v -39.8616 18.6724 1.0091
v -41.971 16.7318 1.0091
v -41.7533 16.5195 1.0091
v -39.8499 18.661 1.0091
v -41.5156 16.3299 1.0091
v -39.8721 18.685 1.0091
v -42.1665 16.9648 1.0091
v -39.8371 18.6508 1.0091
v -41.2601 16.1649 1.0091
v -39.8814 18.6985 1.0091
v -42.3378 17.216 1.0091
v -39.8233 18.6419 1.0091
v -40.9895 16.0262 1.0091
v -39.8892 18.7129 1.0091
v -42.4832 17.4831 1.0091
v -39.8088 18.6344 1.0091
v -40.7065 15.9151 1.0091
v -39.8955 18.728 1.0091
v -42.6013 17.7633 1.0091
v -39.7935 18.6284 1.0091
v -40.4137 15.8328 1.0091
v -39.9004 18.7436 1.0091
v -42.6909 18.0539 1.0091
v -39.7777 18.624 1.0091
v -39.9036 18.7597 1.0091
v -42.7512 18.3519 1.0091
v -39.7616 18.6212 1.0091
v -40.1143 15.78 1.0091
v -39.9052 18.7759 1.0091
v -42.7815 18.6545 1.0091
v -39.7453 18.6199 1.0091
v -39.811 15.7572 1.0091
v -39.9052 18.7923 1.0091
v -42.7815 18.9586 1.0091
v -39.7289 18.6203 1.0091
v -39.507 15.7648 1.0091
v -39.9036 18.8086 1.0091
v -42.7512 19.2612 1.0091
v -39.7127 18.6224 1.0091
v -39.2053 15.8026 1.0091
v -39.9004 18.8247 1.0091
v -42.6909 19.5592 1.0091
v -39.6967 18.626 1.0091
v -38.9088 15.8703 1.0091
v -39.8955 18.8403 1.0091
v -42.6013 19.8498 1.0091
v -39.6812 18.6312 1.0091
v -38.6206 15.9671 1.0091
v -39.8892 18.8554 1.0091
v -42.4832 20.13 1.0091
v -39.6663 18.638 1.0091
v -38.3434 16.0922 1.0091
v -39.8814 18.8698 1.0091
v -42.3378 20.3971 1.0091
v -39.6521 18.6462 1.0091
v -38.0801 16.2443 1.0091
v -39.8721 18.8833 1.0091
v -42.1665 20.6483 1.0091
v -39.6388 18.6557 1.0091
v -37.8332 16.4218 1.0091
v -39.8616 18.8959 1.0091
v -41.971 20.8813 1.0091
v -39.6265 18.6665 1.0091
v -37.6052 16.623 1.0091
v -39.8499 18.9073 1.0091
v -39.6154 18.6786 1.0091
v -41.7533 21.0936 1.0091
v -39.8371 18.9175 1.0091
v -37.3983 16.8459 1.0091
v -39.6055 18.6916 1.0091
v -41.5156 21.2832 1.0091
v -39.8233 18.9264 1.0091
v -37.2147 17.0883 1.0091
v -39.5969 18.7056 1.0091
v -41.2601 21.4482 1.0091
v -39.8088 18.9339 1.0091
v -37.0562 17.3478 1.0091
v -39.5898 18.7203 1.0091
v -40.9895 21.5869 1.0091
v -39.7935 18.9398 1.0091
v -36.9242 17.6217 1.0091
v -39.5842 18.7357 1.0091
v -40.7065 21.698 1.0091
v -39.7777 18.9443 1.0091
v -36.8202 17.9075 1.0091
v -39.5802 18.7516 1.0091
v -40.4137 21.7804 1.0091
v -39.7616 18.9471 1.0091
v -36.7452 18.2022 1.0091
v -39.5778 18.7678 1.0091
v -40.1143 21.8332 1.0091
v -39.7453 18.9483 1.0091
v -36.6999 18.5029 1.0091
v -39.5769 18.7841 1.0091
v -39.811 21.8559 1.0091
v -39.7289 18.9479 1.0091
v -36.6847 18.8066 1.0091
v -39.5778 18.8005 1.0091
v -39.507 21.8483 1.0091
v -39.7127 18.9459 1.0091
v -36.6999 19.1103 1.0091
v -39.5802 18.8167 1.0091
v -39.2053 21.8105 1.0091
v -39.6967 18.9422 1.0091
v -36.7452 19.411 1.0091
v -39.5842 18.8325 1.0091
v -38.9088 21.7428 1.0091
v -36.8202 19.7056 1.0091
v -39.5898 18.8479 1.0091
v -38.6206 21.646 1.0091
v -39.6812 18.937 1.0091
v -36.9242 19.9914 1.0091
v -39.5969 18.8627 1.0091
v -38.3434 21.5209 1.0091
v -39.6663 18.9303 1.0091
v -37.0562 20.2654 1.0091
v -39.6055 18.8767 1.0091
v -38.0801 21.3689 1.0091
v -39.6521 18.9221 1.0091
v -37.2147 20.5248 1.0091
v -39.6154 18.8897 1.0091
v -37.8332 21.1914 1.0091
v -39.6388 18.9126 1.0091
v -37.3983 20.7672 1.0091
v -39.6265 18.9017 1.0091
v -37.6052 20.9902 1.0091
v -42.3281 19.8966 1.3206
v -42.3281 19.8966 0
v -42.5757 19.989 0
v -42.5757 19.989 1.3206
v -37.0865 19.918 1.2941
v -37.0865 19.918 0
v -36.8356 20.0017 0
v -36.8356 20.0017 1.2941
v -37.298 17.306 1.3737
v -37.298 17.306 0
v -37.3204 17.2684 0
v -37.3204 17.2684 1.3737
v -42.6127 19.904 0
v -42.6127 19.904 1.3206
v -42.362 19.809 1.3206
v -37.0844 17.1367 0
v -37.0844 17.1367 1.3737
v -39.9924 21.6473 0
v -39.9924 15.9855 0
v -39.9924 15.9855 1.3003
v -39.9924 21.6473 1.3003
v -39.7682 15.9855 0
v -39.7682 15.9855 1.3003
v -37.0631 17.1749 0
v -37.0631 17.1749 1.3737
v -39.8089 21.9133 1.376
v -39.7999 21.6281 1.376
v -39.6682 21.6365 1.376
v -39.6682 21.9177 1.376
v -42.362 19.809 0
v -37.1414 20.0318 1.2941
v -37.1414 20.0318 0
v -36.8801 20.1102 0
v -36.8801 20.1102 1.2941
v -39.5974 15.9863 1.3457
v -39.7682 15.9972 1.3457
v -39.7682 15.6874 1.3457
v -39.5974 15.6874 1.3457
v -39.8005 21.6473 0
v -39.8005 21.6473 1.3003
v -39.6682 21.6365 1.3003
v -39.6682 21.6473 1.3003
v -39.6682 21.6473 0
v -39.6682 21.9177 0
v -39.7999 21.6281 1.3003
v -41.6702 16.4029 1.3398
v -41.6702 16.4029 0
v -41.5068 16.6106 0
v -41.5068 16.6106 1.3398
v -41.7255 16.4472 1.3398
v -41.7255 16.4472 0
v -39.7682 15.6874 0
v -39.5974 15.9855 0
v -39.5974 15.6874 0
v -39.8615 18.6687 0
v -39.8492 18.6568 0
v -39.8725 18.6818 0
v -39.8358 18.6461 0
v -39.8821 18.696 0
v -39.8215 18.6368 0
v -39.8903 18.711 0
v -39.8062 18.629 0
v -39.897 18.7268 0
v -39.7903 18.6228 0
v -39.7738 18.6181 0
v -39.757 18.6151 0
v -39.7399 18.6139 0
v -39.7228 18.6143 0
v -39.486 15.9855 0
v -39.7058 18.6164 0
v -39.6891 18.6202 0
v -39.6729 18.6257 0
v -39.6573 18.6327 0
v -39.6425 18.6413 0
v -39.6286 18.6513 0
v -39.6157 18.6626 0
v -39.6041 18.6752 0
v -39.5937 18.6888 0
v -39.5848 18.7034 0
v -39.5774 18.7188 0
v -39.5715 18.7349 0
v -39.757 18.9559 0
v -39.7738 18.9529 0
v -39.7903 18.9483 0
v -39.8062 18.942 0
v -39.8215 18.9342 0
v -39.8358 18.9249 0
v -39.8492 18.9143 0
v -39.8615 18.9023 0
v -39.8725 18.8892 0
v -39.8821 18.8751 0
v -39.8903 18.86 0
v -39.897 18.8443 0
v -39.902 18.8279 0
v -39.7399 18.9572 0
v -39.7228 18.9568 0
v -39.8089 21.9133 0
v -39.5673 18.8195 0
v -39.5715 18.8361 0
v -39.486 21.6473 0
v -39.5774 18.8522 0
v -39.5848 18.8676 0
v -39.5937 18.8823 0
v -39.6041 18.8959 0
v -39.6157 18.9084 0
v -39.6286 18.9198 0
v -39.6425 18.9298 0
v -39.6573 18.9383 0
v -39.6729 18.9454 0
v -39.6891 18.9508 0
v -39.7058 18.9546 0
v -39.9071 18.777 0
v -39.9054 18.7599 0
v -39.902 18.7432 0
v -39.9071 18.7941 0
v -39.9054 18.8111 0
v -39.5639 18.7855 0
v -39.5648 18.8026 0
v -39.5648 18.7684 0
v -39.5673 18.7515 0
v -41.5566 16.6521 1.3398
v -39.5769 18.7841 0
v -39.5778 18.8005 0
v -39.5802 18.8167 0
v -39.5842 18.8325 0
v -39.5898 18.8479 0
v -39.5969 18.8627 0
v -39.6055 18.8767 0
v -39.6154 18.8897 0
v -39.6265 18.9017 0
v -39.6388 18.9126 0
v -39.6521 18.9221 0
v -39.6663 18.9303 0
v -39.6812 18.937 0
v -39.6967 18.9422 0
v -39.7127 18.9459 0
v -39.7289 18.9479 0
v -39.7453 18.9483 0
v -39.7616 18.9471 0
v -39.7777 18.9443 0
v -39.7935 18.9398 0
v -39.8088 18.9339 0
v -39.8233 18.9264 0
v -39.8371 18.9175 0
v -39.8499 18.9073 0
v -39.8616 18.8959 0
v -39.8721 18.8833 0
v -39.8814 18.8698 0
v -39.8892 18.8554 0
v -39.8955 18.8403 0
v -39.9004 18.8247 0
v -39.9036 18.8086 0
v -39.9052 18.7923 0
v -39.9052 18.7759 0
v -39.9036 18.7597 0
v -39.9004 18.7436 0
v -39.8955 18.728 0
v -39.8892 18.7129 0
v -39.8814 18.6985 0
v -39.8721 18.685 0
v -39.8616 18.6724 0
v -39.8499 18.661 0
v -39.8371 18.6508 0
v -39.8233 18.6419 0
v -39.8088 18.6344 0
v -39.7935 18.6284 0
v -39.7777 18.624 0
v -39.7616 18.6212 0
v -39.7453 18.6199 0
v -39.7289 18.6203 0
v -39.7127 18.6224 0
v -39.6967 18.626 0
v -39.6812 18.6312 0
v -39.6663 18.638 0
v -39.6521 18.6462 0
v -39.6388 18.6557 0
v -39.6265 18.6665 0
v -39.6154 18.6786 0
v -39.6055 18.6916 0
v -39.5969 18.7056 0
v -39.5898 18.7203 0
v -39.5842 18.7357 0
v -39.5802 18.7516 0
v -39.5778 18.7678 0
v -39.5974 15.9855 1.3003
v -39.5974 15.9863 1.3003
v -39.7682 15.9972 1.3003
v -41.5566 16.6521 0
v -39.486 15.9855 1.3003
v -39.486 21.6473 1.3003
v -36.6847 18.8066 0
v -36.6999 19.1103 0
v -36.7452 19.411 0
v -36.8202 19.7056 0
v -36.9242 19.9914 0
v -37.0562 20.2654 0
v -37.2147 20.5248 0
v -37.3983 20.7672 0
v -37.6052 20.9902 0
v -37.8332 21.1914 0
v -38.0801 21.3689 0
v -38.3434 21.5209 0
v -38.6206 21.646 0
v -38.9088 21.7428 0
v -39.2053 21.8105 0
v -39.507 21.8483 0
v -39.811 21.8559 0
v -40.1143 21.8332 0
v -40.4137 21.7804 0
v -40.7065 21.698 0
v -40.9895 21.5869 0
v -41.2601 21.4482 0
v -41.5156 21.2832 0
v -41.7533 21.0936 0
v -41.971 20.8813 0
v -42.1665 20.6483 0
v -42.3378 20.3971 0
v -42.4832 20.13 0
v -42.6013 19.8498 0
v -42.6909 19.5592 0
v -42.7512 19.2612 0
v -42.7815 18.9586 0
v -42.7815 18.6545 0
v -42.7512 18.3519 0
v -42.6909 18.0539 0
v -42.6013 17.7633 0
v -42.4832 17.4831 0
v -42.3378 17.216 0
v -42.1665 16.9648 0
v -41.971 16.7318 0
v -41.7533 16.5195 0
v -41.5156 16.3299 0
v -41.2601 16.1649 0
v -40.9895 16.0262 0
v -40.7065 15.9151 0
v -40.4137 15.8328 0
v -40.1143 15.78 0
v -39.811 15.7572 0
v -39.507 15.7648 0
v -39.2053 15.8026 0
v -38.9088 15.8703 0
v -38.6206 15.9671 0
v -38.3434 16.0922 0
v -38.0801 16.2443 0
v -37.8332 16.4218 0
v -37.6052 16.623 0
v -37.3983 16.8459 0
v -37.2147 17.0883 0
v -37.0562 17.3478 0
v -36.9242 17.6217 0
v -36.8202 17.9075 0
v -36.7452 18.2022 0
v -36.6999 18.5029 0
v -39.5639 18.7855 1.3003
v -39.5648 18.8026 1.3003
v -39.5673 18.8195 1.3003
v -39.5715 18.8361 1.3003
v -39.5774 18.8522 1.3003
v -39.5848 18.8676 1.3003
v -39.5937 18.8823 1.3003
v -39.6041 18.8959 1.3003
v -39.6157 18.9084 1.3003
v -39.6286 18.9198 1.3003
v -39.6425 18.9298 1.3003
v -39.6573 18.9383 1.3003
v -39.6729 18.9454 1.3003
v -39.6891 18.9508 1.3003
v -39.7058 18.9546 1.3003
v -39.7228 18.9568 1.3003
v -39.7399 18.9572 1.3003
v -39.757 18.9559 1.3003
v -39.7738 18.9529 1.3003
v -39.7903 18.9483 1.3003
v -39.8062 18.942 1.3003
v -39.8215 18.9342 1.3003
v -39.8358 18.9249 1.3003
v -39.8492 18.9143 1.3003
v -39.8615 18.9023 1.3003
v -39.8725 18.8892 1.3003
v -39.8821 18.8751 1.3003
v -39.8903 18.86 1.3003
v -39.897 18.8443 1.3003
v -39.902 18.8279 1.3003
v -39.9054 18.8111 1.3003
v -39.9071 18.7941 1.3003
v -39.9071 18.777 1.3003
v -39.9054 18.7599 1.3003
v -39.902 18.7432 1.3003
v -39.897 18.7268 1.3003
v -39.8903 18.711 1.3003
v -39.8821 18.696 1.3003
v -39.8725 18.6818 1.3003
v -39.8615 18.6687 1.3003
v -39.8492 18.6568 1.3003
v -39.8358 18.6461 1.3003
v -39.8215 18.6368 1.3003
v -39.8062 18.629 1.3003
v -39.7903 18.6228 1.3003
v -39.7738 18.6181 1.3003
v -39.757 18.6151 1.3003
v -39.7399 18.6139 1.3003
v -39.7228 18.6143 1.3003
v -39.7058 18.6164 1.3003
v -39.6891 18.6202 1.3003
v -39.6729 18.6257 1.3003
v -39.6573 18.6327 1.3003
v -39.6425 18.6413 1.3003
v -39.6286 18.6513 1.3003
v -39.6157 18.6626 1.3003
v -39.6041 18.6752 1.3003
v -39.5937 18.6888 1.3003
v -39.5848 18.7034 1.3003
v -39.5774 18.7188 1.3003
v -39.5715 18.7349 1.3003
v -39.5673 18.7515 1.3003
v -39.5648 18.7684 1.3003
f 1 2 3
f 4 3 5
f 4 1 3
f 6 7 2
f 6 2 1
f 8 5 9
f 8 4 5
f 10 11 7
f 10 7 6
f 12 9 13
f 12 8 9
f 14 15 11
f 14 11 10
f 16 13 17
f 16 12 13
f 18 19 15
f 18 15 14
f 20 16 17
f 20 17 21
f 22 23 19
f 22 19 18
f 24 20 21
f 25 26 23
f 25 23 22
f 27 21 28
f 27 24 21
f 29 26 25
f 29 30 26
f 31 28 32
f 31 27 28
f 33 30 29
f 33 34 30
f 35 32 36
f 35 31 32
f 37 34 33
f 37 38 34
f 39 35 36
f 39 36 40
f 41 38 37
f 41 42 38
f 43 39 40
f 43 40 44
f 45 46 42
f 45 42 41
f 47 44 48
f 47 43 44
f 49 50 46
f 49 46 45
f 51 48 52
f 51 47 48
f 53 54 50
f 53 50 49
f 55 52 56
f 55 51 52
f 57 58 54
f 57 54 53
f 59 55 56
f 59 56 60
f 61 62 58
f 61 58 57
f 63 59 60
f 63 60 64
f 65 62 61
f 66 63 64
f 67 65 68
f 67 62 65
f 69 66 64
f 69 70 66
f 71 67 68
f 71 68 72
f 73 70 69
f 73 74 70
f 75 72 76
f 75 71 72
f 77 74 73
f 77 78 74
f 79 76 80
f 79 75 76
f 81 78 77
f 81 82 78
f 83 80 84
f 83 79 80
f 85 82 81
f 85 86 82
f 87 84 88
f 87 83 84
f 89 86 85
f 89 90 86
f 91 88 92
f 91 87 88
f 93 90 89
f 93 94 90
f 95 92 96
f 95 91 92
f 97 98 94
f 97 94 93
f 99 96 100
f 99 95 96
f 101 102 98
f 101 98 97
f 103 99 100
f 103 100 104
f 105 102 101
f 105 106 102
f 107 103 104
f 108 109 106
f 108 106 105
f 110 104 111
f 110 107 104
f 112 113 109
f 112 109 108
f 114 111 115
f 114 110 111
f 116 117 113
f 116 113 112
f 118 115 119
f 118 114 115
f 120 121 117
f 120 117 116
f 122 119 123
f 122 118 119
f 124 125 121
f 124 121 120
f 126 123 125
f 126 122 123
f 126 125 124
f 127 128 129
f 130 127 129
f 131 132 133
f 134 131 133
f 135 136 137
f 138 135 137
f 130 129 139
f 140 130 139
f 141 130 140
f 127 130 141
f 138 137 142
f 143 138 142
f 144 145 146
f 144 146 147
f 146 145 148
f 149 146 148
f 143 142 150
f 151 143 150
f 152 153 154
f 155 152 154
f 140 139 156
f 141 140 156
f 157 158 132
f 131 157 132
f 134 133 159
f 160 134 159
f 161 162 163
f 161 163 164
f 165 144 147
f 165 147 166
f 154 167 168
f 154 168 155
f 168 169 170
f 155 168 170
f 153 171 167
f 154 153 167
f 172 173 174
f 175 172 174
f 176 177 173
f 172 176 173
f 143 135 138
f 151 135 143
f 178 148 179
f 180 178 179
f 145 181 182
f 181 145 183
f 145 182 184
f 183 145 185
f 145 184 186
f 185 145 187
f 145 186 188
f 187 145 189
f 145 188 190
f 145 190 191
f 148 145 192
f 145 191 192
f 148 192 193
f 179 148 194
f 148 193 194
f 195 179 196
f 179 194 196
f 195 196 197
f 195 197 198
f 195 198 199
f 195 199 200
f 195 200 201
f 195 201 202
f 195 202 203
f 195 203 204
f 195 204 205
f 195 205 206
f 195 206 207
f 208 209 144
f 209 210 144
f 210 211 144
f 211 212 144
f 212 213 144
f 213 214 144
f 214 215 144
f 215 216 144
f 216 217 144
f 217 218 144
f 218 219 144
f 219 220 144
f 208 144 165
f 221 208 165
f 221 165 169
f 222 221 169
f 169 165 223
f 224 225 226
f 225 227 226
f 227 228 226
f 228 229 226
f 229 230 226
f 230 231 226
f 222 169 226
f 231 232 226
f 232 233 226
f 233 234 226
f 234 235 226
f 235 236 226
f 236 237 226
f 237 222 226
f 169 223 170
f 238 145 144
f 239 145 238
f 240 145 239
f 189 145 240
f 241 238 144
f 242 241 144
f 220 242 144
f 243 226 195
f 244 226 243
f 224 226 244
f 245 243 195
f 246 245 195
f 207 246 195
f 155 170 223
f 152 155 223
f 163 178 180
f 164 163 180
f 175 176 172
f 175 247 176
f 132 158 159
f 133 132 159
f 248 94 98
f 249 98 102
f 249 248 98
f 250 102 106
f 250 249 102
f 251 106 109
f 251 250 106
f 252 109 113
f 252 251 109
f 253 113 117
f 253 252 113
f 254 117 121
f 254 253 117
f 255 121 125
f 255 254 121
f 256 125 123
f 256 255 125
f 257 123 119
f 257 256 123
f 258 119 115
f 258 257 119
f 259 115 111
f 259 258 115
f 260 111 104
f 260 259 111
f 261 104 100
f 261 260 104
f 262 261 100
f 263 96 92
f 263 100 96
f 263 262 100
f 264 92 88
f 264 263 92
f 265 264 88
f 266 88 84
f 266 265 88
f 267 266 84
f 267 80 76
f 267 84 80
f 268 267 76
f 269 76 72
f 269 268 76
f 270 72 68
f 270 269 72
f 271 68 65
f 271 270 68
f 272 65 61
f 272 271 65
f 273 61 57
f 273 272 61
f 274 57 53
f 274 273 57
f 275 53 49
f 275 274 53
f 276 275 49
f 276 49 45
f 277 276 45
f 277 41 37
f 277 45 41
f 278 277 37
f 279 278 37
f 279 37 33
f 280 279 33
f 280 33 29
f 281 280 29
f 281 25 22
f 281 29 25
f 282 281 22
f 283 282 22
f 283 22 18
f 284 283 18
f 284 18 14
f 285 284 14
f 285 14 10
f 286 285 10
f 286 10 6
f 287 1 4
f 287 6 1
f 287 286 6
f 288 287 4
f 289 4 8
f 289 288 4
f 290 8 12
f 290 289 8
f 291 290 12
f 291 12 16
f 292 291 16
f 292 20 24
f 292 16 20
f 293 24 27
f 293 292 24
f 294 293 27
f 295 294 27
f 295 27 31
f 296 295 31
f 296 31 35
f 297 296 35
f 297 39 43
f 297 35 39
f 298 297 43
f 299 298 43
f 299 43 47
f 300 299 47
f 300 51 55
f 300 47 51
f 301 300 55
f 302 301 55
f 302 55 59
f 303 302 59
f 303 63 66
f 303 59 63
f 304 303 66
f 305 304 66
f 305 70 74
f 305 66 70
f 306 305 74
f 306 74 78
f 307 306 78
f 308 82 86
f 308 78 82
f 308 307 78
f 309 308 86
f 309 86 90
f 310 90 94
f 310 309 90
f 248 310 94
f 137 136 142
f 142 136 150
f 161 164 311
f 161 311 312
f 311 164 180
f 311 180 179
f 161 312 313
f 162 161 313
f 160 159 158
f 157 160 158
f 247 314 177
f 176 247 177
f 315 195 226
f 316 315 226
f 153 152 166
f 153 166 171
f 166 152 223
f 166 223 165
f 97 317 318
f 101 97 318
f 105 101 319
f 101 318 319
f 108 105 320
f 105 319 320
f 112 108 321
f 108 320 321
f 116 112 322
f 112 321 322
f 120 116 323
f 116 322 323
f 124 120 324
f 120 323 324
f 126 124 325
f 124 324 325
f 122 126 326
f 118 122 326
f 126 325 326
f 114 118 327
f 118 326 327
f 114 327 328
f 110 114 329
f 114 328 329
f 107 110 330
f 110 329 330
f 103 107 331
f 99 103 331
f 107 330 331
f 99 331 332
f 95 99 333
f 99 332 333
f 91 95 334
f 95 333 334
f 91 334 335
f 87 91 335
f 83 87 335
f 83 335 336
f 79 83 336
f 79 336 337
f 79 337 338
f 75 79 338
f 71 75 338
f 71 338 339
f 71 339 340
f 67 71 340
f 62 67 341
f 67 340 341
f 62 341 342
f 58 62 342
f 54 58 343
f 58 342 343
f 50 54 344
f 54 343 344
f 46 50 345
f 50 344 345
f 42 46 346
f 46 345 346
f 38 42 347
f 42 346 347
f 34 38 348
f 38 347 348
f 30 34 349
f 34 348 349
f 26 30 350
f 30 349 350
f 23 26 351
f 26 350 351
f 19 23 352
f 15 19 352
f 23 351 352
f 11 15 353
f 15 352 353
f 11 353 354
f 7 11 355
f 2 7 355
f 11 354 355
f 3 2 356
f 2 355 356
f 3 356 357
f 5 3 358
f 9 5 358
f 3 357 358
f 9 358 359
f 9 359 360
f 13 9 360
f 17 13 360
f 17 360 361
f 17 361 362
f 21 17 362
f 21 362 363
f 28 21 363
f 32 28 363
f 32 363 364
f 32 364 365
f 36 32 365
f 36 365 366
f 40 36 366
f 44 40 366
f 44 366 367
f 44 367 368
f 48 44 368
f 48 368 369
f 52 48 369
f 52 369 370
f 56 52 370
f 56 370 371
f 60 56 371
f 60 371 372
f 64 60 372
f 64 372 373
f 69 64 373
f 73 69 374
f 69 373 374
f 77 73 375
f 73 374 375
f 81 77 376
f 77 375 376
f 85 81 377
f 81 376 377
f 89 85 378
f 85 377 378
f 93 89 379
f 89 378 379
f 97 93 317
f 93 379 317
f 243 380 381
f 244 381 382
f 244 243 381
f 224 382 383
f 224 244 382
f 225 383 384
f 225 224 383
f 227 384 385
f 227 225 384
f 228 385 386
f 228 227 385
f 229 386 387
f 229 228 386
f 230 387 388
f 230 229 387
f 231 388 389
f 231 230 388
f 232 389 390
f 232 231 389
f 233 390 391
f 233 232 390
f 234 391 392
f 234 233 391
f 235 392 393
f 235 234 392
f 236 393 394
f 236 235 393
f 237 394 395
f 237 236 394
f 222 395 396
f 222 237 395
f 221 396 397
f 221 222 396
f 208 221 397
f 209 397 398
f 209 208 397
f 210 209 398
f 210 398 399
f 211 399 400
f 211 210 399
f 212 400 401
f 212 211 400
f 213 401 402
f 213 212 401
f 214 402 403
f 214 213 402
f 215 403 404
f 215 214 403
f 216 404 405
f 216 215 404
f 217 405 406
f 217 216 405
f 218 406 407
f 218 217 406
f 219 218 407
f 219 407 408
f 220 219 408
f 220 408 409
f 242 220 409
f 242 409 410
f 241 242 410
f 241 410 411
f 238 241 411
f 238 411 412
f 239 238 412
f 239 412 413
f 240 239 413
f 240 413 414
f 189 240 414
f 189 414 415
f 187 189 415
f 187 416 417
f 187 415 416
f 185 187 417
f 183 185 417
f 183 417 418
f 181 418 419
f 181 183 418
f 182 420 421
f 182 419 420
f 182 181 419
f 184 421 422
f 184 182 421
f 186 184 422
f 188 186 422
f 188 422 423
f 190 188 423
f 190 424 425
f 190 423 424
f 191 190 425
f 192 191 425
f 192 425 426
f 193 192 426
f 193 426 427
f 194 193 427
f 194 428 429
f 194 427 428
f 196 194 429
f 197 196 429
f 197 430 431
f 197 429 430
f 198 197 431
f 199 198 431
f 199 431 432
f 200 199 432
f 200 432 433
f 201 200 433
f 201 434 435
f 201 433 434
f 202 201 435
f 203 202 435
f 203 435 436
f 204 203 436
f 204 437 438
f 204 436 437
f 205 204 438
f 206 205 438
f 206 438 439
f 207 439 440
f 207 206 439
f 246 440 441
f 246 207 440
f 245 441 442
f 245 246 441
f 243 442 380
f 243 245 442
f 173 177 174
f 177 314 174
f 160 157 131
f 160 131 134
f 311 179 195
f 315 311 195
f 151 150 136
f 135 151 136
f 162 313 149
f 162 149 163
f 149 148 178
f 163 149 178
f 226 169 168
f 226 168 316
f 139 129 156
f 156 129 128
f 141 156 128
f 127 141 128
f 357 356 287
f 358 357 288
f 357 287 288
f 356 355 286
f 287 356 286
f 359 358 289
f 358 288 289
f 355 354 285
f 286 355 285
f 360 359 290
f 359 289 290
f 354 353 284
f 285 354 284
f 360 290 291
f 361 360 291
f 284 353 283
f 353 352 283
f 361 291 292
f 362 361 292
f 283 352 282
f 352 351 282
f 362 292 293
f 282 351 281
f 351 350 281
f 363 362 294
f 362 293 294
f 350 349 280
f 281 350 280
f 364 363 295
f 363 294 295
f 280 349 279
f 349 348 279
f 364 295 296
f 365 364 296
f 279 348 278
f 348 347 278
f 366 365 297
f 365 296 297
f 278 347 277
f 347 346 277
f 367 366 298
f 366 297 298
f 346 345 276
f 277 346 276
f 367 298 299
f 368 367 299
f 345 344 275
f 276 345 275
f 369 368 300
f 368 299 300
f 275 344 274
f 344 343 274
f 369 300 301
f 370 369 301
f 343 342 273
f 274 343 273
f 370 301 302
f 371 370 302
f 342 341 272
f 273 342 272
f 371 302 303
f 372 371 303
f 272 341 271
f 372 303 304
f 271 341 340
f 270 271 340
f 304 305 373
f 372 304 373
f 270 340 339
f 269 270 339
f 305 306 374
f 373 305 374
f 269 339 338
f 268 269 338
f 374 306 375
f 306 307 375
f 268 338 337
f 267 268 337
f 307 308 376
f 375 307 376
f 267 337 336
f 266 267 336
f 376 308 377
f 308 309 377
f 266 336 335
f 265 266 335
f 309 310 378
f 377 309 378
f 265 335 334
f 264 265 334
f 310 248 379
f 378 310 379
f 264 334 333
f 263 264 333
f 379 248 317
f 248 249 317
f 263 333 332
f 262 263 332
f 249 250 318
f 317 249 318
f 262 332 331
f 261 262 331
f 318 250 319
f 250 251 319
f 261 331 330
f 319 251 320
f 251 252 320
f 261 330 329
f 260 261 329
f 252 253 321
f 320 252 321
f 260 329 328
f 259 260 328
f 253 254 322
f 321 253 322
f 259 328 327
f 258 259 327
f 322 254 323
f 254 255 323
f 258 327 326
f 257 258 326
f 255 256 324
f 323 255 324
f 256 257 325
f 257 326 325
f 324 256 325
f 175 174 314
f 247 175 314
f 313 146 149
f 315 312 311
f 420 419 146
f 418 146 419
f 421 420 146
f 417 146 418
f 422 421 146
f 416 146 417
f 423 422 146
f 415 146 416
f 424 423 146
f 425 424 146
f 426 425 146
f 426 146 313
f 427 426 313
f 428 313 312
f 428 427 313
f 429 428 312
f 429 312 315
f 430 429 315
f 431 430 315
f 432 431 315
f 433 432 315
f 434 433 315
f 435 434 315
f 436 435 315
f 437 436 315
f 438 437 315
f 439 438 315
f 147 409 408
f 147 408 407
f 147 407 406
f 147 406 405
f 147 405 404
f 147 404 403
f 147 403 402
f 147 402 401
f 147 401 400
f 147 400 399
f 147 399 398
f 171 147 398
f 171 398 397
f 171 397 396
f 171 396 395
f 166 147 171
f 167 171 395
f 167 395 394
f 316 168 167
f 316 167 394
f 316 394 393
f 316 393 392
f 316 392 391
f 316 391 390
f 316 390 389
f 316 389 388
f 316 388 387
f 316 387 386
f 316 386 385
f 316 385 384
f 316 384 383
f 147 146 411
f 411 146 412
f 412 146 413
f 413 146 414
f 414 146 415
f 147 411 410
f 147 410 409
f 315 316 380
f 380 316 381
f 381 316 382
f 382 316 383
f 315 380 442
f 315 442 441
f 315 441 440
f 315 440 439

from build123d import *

# Parameters (mm, degrees)
F0_W      = 0.506427
F0_H      = 5.661787
F1_DEPTH  = 1.30028
F3_DEPTH  = 1.32063
F5_DEPTH  = 1.29407
F7_DEPTH  = 1.33985
F9_DEPTH  = 1.37372
F11_DEPTH = 1.34573
F13_DEPTH = 1.37604
F14_R     = 0.171709
F15_DEPTH = 25.4
F16_R     = 3.050278
F17_DEPTH = 1.00911
F18_R     = 0.164255
F19_DEPTH = 25.4


with BuildPart() as f1:
    # F0 (on Top) → F1 (new body)
    with BuildSketch(Plane.XY):
        with Locations((-39.739219, 18.816423)):
            Rectangle(F0_W, F0_H)
    extrude(amount=F1_DEPTH)

    # F10 (on Top) → F11 (join)
    with BuildSketch(Plane.XY):
        Polygon((-39.597359, 15.687432), (-39.597359, 15.986275), (-39.768159, 15.997162), (-39.768159, 15.687432), align=None)
    extrude(amount=F11_DEPTH)

    # F12 (on Top) → F13 (join)
    with BuildSketch(Plane.XY):
        Polygon((-39.799942, 21.628097), (-39.668221, 21.636469), (-39.668221, 21.917734), (-39.808854, 21.91334), align=None)
    extrude(amount=F13_DEPTH)

    # F14 (on Top) → F15 (cut)
    with BuildSketch(Plane.XY):
        with Locations((-39.735612, 18.785525)):
            Circle(F14_R)
    extrude(amount=F15_DEPTH, mode=Mode.SUBTRACT)


with BuildPart() as f3:
    # F2 (on Top) → F3 (new body)
    with BuildSketch(Plane.XY):
        Polygon((-42.612698, 19.904027), (-42.361978, 19.809047), (-42.328142, 19.896636), (-42.575743, 19.989025), align=None)
    extrude(amount=F3_DEPTH)


with BuildPart() as f5:
    # F4 (on Top) → F5 (new body)
    with BuildSketch(Plane.XY):
        Polygon((-37.141386, 20.031832), (-37.086494, 19.918036), (-36.835633, 20.001655), (-36.880072, 20.110225), align=None)
    extrude(amount=F5_DEPTH)


with BuildPart() as f7:
    # F6 (on Top) → F7 (new body)
    with BuildSketch(Plane.XY):
        Polygon((-41.72552, 16.44722), (-41.670151, 16.402923), (-41.506808, 16.610563), (-41.556641, 16.65209), align=None)
    extrude(amount=F7_DEPTH)


with BuildPart() as f9:
    # F8 (on Top) → F9 (new body)
    with BuildSketch(Plane.XY):
        Polygon((-37.063103, 17.174851), (-37.29802, 17.306013), (-37.320408, 17.26843), (-37.084421, 17.13667), align=None)
    extrude(amount=F9_DEPTH)


with BuildPart() as f17:
    # F16 (on Top) → F17 (new body)
    with BuildSketch(Plane.XY):
        with Locations((-39.734986, 18.806564)):
            Circle(F16_R)
    extrude(amount=F17_DEPTH)

    # F18 (on Top) → F19 (cut)
    with BuildSketch(Plane.XY):
        with Locations((-39.741199, 18.784132)):
            Circle(F18_R)
    extrude(amount=F19_DEPTH, mode=Mode.SUBTRACT)


solid = Compound([f1.part, f3.part, f5.part, f7.part, f9.part, f17.part])
